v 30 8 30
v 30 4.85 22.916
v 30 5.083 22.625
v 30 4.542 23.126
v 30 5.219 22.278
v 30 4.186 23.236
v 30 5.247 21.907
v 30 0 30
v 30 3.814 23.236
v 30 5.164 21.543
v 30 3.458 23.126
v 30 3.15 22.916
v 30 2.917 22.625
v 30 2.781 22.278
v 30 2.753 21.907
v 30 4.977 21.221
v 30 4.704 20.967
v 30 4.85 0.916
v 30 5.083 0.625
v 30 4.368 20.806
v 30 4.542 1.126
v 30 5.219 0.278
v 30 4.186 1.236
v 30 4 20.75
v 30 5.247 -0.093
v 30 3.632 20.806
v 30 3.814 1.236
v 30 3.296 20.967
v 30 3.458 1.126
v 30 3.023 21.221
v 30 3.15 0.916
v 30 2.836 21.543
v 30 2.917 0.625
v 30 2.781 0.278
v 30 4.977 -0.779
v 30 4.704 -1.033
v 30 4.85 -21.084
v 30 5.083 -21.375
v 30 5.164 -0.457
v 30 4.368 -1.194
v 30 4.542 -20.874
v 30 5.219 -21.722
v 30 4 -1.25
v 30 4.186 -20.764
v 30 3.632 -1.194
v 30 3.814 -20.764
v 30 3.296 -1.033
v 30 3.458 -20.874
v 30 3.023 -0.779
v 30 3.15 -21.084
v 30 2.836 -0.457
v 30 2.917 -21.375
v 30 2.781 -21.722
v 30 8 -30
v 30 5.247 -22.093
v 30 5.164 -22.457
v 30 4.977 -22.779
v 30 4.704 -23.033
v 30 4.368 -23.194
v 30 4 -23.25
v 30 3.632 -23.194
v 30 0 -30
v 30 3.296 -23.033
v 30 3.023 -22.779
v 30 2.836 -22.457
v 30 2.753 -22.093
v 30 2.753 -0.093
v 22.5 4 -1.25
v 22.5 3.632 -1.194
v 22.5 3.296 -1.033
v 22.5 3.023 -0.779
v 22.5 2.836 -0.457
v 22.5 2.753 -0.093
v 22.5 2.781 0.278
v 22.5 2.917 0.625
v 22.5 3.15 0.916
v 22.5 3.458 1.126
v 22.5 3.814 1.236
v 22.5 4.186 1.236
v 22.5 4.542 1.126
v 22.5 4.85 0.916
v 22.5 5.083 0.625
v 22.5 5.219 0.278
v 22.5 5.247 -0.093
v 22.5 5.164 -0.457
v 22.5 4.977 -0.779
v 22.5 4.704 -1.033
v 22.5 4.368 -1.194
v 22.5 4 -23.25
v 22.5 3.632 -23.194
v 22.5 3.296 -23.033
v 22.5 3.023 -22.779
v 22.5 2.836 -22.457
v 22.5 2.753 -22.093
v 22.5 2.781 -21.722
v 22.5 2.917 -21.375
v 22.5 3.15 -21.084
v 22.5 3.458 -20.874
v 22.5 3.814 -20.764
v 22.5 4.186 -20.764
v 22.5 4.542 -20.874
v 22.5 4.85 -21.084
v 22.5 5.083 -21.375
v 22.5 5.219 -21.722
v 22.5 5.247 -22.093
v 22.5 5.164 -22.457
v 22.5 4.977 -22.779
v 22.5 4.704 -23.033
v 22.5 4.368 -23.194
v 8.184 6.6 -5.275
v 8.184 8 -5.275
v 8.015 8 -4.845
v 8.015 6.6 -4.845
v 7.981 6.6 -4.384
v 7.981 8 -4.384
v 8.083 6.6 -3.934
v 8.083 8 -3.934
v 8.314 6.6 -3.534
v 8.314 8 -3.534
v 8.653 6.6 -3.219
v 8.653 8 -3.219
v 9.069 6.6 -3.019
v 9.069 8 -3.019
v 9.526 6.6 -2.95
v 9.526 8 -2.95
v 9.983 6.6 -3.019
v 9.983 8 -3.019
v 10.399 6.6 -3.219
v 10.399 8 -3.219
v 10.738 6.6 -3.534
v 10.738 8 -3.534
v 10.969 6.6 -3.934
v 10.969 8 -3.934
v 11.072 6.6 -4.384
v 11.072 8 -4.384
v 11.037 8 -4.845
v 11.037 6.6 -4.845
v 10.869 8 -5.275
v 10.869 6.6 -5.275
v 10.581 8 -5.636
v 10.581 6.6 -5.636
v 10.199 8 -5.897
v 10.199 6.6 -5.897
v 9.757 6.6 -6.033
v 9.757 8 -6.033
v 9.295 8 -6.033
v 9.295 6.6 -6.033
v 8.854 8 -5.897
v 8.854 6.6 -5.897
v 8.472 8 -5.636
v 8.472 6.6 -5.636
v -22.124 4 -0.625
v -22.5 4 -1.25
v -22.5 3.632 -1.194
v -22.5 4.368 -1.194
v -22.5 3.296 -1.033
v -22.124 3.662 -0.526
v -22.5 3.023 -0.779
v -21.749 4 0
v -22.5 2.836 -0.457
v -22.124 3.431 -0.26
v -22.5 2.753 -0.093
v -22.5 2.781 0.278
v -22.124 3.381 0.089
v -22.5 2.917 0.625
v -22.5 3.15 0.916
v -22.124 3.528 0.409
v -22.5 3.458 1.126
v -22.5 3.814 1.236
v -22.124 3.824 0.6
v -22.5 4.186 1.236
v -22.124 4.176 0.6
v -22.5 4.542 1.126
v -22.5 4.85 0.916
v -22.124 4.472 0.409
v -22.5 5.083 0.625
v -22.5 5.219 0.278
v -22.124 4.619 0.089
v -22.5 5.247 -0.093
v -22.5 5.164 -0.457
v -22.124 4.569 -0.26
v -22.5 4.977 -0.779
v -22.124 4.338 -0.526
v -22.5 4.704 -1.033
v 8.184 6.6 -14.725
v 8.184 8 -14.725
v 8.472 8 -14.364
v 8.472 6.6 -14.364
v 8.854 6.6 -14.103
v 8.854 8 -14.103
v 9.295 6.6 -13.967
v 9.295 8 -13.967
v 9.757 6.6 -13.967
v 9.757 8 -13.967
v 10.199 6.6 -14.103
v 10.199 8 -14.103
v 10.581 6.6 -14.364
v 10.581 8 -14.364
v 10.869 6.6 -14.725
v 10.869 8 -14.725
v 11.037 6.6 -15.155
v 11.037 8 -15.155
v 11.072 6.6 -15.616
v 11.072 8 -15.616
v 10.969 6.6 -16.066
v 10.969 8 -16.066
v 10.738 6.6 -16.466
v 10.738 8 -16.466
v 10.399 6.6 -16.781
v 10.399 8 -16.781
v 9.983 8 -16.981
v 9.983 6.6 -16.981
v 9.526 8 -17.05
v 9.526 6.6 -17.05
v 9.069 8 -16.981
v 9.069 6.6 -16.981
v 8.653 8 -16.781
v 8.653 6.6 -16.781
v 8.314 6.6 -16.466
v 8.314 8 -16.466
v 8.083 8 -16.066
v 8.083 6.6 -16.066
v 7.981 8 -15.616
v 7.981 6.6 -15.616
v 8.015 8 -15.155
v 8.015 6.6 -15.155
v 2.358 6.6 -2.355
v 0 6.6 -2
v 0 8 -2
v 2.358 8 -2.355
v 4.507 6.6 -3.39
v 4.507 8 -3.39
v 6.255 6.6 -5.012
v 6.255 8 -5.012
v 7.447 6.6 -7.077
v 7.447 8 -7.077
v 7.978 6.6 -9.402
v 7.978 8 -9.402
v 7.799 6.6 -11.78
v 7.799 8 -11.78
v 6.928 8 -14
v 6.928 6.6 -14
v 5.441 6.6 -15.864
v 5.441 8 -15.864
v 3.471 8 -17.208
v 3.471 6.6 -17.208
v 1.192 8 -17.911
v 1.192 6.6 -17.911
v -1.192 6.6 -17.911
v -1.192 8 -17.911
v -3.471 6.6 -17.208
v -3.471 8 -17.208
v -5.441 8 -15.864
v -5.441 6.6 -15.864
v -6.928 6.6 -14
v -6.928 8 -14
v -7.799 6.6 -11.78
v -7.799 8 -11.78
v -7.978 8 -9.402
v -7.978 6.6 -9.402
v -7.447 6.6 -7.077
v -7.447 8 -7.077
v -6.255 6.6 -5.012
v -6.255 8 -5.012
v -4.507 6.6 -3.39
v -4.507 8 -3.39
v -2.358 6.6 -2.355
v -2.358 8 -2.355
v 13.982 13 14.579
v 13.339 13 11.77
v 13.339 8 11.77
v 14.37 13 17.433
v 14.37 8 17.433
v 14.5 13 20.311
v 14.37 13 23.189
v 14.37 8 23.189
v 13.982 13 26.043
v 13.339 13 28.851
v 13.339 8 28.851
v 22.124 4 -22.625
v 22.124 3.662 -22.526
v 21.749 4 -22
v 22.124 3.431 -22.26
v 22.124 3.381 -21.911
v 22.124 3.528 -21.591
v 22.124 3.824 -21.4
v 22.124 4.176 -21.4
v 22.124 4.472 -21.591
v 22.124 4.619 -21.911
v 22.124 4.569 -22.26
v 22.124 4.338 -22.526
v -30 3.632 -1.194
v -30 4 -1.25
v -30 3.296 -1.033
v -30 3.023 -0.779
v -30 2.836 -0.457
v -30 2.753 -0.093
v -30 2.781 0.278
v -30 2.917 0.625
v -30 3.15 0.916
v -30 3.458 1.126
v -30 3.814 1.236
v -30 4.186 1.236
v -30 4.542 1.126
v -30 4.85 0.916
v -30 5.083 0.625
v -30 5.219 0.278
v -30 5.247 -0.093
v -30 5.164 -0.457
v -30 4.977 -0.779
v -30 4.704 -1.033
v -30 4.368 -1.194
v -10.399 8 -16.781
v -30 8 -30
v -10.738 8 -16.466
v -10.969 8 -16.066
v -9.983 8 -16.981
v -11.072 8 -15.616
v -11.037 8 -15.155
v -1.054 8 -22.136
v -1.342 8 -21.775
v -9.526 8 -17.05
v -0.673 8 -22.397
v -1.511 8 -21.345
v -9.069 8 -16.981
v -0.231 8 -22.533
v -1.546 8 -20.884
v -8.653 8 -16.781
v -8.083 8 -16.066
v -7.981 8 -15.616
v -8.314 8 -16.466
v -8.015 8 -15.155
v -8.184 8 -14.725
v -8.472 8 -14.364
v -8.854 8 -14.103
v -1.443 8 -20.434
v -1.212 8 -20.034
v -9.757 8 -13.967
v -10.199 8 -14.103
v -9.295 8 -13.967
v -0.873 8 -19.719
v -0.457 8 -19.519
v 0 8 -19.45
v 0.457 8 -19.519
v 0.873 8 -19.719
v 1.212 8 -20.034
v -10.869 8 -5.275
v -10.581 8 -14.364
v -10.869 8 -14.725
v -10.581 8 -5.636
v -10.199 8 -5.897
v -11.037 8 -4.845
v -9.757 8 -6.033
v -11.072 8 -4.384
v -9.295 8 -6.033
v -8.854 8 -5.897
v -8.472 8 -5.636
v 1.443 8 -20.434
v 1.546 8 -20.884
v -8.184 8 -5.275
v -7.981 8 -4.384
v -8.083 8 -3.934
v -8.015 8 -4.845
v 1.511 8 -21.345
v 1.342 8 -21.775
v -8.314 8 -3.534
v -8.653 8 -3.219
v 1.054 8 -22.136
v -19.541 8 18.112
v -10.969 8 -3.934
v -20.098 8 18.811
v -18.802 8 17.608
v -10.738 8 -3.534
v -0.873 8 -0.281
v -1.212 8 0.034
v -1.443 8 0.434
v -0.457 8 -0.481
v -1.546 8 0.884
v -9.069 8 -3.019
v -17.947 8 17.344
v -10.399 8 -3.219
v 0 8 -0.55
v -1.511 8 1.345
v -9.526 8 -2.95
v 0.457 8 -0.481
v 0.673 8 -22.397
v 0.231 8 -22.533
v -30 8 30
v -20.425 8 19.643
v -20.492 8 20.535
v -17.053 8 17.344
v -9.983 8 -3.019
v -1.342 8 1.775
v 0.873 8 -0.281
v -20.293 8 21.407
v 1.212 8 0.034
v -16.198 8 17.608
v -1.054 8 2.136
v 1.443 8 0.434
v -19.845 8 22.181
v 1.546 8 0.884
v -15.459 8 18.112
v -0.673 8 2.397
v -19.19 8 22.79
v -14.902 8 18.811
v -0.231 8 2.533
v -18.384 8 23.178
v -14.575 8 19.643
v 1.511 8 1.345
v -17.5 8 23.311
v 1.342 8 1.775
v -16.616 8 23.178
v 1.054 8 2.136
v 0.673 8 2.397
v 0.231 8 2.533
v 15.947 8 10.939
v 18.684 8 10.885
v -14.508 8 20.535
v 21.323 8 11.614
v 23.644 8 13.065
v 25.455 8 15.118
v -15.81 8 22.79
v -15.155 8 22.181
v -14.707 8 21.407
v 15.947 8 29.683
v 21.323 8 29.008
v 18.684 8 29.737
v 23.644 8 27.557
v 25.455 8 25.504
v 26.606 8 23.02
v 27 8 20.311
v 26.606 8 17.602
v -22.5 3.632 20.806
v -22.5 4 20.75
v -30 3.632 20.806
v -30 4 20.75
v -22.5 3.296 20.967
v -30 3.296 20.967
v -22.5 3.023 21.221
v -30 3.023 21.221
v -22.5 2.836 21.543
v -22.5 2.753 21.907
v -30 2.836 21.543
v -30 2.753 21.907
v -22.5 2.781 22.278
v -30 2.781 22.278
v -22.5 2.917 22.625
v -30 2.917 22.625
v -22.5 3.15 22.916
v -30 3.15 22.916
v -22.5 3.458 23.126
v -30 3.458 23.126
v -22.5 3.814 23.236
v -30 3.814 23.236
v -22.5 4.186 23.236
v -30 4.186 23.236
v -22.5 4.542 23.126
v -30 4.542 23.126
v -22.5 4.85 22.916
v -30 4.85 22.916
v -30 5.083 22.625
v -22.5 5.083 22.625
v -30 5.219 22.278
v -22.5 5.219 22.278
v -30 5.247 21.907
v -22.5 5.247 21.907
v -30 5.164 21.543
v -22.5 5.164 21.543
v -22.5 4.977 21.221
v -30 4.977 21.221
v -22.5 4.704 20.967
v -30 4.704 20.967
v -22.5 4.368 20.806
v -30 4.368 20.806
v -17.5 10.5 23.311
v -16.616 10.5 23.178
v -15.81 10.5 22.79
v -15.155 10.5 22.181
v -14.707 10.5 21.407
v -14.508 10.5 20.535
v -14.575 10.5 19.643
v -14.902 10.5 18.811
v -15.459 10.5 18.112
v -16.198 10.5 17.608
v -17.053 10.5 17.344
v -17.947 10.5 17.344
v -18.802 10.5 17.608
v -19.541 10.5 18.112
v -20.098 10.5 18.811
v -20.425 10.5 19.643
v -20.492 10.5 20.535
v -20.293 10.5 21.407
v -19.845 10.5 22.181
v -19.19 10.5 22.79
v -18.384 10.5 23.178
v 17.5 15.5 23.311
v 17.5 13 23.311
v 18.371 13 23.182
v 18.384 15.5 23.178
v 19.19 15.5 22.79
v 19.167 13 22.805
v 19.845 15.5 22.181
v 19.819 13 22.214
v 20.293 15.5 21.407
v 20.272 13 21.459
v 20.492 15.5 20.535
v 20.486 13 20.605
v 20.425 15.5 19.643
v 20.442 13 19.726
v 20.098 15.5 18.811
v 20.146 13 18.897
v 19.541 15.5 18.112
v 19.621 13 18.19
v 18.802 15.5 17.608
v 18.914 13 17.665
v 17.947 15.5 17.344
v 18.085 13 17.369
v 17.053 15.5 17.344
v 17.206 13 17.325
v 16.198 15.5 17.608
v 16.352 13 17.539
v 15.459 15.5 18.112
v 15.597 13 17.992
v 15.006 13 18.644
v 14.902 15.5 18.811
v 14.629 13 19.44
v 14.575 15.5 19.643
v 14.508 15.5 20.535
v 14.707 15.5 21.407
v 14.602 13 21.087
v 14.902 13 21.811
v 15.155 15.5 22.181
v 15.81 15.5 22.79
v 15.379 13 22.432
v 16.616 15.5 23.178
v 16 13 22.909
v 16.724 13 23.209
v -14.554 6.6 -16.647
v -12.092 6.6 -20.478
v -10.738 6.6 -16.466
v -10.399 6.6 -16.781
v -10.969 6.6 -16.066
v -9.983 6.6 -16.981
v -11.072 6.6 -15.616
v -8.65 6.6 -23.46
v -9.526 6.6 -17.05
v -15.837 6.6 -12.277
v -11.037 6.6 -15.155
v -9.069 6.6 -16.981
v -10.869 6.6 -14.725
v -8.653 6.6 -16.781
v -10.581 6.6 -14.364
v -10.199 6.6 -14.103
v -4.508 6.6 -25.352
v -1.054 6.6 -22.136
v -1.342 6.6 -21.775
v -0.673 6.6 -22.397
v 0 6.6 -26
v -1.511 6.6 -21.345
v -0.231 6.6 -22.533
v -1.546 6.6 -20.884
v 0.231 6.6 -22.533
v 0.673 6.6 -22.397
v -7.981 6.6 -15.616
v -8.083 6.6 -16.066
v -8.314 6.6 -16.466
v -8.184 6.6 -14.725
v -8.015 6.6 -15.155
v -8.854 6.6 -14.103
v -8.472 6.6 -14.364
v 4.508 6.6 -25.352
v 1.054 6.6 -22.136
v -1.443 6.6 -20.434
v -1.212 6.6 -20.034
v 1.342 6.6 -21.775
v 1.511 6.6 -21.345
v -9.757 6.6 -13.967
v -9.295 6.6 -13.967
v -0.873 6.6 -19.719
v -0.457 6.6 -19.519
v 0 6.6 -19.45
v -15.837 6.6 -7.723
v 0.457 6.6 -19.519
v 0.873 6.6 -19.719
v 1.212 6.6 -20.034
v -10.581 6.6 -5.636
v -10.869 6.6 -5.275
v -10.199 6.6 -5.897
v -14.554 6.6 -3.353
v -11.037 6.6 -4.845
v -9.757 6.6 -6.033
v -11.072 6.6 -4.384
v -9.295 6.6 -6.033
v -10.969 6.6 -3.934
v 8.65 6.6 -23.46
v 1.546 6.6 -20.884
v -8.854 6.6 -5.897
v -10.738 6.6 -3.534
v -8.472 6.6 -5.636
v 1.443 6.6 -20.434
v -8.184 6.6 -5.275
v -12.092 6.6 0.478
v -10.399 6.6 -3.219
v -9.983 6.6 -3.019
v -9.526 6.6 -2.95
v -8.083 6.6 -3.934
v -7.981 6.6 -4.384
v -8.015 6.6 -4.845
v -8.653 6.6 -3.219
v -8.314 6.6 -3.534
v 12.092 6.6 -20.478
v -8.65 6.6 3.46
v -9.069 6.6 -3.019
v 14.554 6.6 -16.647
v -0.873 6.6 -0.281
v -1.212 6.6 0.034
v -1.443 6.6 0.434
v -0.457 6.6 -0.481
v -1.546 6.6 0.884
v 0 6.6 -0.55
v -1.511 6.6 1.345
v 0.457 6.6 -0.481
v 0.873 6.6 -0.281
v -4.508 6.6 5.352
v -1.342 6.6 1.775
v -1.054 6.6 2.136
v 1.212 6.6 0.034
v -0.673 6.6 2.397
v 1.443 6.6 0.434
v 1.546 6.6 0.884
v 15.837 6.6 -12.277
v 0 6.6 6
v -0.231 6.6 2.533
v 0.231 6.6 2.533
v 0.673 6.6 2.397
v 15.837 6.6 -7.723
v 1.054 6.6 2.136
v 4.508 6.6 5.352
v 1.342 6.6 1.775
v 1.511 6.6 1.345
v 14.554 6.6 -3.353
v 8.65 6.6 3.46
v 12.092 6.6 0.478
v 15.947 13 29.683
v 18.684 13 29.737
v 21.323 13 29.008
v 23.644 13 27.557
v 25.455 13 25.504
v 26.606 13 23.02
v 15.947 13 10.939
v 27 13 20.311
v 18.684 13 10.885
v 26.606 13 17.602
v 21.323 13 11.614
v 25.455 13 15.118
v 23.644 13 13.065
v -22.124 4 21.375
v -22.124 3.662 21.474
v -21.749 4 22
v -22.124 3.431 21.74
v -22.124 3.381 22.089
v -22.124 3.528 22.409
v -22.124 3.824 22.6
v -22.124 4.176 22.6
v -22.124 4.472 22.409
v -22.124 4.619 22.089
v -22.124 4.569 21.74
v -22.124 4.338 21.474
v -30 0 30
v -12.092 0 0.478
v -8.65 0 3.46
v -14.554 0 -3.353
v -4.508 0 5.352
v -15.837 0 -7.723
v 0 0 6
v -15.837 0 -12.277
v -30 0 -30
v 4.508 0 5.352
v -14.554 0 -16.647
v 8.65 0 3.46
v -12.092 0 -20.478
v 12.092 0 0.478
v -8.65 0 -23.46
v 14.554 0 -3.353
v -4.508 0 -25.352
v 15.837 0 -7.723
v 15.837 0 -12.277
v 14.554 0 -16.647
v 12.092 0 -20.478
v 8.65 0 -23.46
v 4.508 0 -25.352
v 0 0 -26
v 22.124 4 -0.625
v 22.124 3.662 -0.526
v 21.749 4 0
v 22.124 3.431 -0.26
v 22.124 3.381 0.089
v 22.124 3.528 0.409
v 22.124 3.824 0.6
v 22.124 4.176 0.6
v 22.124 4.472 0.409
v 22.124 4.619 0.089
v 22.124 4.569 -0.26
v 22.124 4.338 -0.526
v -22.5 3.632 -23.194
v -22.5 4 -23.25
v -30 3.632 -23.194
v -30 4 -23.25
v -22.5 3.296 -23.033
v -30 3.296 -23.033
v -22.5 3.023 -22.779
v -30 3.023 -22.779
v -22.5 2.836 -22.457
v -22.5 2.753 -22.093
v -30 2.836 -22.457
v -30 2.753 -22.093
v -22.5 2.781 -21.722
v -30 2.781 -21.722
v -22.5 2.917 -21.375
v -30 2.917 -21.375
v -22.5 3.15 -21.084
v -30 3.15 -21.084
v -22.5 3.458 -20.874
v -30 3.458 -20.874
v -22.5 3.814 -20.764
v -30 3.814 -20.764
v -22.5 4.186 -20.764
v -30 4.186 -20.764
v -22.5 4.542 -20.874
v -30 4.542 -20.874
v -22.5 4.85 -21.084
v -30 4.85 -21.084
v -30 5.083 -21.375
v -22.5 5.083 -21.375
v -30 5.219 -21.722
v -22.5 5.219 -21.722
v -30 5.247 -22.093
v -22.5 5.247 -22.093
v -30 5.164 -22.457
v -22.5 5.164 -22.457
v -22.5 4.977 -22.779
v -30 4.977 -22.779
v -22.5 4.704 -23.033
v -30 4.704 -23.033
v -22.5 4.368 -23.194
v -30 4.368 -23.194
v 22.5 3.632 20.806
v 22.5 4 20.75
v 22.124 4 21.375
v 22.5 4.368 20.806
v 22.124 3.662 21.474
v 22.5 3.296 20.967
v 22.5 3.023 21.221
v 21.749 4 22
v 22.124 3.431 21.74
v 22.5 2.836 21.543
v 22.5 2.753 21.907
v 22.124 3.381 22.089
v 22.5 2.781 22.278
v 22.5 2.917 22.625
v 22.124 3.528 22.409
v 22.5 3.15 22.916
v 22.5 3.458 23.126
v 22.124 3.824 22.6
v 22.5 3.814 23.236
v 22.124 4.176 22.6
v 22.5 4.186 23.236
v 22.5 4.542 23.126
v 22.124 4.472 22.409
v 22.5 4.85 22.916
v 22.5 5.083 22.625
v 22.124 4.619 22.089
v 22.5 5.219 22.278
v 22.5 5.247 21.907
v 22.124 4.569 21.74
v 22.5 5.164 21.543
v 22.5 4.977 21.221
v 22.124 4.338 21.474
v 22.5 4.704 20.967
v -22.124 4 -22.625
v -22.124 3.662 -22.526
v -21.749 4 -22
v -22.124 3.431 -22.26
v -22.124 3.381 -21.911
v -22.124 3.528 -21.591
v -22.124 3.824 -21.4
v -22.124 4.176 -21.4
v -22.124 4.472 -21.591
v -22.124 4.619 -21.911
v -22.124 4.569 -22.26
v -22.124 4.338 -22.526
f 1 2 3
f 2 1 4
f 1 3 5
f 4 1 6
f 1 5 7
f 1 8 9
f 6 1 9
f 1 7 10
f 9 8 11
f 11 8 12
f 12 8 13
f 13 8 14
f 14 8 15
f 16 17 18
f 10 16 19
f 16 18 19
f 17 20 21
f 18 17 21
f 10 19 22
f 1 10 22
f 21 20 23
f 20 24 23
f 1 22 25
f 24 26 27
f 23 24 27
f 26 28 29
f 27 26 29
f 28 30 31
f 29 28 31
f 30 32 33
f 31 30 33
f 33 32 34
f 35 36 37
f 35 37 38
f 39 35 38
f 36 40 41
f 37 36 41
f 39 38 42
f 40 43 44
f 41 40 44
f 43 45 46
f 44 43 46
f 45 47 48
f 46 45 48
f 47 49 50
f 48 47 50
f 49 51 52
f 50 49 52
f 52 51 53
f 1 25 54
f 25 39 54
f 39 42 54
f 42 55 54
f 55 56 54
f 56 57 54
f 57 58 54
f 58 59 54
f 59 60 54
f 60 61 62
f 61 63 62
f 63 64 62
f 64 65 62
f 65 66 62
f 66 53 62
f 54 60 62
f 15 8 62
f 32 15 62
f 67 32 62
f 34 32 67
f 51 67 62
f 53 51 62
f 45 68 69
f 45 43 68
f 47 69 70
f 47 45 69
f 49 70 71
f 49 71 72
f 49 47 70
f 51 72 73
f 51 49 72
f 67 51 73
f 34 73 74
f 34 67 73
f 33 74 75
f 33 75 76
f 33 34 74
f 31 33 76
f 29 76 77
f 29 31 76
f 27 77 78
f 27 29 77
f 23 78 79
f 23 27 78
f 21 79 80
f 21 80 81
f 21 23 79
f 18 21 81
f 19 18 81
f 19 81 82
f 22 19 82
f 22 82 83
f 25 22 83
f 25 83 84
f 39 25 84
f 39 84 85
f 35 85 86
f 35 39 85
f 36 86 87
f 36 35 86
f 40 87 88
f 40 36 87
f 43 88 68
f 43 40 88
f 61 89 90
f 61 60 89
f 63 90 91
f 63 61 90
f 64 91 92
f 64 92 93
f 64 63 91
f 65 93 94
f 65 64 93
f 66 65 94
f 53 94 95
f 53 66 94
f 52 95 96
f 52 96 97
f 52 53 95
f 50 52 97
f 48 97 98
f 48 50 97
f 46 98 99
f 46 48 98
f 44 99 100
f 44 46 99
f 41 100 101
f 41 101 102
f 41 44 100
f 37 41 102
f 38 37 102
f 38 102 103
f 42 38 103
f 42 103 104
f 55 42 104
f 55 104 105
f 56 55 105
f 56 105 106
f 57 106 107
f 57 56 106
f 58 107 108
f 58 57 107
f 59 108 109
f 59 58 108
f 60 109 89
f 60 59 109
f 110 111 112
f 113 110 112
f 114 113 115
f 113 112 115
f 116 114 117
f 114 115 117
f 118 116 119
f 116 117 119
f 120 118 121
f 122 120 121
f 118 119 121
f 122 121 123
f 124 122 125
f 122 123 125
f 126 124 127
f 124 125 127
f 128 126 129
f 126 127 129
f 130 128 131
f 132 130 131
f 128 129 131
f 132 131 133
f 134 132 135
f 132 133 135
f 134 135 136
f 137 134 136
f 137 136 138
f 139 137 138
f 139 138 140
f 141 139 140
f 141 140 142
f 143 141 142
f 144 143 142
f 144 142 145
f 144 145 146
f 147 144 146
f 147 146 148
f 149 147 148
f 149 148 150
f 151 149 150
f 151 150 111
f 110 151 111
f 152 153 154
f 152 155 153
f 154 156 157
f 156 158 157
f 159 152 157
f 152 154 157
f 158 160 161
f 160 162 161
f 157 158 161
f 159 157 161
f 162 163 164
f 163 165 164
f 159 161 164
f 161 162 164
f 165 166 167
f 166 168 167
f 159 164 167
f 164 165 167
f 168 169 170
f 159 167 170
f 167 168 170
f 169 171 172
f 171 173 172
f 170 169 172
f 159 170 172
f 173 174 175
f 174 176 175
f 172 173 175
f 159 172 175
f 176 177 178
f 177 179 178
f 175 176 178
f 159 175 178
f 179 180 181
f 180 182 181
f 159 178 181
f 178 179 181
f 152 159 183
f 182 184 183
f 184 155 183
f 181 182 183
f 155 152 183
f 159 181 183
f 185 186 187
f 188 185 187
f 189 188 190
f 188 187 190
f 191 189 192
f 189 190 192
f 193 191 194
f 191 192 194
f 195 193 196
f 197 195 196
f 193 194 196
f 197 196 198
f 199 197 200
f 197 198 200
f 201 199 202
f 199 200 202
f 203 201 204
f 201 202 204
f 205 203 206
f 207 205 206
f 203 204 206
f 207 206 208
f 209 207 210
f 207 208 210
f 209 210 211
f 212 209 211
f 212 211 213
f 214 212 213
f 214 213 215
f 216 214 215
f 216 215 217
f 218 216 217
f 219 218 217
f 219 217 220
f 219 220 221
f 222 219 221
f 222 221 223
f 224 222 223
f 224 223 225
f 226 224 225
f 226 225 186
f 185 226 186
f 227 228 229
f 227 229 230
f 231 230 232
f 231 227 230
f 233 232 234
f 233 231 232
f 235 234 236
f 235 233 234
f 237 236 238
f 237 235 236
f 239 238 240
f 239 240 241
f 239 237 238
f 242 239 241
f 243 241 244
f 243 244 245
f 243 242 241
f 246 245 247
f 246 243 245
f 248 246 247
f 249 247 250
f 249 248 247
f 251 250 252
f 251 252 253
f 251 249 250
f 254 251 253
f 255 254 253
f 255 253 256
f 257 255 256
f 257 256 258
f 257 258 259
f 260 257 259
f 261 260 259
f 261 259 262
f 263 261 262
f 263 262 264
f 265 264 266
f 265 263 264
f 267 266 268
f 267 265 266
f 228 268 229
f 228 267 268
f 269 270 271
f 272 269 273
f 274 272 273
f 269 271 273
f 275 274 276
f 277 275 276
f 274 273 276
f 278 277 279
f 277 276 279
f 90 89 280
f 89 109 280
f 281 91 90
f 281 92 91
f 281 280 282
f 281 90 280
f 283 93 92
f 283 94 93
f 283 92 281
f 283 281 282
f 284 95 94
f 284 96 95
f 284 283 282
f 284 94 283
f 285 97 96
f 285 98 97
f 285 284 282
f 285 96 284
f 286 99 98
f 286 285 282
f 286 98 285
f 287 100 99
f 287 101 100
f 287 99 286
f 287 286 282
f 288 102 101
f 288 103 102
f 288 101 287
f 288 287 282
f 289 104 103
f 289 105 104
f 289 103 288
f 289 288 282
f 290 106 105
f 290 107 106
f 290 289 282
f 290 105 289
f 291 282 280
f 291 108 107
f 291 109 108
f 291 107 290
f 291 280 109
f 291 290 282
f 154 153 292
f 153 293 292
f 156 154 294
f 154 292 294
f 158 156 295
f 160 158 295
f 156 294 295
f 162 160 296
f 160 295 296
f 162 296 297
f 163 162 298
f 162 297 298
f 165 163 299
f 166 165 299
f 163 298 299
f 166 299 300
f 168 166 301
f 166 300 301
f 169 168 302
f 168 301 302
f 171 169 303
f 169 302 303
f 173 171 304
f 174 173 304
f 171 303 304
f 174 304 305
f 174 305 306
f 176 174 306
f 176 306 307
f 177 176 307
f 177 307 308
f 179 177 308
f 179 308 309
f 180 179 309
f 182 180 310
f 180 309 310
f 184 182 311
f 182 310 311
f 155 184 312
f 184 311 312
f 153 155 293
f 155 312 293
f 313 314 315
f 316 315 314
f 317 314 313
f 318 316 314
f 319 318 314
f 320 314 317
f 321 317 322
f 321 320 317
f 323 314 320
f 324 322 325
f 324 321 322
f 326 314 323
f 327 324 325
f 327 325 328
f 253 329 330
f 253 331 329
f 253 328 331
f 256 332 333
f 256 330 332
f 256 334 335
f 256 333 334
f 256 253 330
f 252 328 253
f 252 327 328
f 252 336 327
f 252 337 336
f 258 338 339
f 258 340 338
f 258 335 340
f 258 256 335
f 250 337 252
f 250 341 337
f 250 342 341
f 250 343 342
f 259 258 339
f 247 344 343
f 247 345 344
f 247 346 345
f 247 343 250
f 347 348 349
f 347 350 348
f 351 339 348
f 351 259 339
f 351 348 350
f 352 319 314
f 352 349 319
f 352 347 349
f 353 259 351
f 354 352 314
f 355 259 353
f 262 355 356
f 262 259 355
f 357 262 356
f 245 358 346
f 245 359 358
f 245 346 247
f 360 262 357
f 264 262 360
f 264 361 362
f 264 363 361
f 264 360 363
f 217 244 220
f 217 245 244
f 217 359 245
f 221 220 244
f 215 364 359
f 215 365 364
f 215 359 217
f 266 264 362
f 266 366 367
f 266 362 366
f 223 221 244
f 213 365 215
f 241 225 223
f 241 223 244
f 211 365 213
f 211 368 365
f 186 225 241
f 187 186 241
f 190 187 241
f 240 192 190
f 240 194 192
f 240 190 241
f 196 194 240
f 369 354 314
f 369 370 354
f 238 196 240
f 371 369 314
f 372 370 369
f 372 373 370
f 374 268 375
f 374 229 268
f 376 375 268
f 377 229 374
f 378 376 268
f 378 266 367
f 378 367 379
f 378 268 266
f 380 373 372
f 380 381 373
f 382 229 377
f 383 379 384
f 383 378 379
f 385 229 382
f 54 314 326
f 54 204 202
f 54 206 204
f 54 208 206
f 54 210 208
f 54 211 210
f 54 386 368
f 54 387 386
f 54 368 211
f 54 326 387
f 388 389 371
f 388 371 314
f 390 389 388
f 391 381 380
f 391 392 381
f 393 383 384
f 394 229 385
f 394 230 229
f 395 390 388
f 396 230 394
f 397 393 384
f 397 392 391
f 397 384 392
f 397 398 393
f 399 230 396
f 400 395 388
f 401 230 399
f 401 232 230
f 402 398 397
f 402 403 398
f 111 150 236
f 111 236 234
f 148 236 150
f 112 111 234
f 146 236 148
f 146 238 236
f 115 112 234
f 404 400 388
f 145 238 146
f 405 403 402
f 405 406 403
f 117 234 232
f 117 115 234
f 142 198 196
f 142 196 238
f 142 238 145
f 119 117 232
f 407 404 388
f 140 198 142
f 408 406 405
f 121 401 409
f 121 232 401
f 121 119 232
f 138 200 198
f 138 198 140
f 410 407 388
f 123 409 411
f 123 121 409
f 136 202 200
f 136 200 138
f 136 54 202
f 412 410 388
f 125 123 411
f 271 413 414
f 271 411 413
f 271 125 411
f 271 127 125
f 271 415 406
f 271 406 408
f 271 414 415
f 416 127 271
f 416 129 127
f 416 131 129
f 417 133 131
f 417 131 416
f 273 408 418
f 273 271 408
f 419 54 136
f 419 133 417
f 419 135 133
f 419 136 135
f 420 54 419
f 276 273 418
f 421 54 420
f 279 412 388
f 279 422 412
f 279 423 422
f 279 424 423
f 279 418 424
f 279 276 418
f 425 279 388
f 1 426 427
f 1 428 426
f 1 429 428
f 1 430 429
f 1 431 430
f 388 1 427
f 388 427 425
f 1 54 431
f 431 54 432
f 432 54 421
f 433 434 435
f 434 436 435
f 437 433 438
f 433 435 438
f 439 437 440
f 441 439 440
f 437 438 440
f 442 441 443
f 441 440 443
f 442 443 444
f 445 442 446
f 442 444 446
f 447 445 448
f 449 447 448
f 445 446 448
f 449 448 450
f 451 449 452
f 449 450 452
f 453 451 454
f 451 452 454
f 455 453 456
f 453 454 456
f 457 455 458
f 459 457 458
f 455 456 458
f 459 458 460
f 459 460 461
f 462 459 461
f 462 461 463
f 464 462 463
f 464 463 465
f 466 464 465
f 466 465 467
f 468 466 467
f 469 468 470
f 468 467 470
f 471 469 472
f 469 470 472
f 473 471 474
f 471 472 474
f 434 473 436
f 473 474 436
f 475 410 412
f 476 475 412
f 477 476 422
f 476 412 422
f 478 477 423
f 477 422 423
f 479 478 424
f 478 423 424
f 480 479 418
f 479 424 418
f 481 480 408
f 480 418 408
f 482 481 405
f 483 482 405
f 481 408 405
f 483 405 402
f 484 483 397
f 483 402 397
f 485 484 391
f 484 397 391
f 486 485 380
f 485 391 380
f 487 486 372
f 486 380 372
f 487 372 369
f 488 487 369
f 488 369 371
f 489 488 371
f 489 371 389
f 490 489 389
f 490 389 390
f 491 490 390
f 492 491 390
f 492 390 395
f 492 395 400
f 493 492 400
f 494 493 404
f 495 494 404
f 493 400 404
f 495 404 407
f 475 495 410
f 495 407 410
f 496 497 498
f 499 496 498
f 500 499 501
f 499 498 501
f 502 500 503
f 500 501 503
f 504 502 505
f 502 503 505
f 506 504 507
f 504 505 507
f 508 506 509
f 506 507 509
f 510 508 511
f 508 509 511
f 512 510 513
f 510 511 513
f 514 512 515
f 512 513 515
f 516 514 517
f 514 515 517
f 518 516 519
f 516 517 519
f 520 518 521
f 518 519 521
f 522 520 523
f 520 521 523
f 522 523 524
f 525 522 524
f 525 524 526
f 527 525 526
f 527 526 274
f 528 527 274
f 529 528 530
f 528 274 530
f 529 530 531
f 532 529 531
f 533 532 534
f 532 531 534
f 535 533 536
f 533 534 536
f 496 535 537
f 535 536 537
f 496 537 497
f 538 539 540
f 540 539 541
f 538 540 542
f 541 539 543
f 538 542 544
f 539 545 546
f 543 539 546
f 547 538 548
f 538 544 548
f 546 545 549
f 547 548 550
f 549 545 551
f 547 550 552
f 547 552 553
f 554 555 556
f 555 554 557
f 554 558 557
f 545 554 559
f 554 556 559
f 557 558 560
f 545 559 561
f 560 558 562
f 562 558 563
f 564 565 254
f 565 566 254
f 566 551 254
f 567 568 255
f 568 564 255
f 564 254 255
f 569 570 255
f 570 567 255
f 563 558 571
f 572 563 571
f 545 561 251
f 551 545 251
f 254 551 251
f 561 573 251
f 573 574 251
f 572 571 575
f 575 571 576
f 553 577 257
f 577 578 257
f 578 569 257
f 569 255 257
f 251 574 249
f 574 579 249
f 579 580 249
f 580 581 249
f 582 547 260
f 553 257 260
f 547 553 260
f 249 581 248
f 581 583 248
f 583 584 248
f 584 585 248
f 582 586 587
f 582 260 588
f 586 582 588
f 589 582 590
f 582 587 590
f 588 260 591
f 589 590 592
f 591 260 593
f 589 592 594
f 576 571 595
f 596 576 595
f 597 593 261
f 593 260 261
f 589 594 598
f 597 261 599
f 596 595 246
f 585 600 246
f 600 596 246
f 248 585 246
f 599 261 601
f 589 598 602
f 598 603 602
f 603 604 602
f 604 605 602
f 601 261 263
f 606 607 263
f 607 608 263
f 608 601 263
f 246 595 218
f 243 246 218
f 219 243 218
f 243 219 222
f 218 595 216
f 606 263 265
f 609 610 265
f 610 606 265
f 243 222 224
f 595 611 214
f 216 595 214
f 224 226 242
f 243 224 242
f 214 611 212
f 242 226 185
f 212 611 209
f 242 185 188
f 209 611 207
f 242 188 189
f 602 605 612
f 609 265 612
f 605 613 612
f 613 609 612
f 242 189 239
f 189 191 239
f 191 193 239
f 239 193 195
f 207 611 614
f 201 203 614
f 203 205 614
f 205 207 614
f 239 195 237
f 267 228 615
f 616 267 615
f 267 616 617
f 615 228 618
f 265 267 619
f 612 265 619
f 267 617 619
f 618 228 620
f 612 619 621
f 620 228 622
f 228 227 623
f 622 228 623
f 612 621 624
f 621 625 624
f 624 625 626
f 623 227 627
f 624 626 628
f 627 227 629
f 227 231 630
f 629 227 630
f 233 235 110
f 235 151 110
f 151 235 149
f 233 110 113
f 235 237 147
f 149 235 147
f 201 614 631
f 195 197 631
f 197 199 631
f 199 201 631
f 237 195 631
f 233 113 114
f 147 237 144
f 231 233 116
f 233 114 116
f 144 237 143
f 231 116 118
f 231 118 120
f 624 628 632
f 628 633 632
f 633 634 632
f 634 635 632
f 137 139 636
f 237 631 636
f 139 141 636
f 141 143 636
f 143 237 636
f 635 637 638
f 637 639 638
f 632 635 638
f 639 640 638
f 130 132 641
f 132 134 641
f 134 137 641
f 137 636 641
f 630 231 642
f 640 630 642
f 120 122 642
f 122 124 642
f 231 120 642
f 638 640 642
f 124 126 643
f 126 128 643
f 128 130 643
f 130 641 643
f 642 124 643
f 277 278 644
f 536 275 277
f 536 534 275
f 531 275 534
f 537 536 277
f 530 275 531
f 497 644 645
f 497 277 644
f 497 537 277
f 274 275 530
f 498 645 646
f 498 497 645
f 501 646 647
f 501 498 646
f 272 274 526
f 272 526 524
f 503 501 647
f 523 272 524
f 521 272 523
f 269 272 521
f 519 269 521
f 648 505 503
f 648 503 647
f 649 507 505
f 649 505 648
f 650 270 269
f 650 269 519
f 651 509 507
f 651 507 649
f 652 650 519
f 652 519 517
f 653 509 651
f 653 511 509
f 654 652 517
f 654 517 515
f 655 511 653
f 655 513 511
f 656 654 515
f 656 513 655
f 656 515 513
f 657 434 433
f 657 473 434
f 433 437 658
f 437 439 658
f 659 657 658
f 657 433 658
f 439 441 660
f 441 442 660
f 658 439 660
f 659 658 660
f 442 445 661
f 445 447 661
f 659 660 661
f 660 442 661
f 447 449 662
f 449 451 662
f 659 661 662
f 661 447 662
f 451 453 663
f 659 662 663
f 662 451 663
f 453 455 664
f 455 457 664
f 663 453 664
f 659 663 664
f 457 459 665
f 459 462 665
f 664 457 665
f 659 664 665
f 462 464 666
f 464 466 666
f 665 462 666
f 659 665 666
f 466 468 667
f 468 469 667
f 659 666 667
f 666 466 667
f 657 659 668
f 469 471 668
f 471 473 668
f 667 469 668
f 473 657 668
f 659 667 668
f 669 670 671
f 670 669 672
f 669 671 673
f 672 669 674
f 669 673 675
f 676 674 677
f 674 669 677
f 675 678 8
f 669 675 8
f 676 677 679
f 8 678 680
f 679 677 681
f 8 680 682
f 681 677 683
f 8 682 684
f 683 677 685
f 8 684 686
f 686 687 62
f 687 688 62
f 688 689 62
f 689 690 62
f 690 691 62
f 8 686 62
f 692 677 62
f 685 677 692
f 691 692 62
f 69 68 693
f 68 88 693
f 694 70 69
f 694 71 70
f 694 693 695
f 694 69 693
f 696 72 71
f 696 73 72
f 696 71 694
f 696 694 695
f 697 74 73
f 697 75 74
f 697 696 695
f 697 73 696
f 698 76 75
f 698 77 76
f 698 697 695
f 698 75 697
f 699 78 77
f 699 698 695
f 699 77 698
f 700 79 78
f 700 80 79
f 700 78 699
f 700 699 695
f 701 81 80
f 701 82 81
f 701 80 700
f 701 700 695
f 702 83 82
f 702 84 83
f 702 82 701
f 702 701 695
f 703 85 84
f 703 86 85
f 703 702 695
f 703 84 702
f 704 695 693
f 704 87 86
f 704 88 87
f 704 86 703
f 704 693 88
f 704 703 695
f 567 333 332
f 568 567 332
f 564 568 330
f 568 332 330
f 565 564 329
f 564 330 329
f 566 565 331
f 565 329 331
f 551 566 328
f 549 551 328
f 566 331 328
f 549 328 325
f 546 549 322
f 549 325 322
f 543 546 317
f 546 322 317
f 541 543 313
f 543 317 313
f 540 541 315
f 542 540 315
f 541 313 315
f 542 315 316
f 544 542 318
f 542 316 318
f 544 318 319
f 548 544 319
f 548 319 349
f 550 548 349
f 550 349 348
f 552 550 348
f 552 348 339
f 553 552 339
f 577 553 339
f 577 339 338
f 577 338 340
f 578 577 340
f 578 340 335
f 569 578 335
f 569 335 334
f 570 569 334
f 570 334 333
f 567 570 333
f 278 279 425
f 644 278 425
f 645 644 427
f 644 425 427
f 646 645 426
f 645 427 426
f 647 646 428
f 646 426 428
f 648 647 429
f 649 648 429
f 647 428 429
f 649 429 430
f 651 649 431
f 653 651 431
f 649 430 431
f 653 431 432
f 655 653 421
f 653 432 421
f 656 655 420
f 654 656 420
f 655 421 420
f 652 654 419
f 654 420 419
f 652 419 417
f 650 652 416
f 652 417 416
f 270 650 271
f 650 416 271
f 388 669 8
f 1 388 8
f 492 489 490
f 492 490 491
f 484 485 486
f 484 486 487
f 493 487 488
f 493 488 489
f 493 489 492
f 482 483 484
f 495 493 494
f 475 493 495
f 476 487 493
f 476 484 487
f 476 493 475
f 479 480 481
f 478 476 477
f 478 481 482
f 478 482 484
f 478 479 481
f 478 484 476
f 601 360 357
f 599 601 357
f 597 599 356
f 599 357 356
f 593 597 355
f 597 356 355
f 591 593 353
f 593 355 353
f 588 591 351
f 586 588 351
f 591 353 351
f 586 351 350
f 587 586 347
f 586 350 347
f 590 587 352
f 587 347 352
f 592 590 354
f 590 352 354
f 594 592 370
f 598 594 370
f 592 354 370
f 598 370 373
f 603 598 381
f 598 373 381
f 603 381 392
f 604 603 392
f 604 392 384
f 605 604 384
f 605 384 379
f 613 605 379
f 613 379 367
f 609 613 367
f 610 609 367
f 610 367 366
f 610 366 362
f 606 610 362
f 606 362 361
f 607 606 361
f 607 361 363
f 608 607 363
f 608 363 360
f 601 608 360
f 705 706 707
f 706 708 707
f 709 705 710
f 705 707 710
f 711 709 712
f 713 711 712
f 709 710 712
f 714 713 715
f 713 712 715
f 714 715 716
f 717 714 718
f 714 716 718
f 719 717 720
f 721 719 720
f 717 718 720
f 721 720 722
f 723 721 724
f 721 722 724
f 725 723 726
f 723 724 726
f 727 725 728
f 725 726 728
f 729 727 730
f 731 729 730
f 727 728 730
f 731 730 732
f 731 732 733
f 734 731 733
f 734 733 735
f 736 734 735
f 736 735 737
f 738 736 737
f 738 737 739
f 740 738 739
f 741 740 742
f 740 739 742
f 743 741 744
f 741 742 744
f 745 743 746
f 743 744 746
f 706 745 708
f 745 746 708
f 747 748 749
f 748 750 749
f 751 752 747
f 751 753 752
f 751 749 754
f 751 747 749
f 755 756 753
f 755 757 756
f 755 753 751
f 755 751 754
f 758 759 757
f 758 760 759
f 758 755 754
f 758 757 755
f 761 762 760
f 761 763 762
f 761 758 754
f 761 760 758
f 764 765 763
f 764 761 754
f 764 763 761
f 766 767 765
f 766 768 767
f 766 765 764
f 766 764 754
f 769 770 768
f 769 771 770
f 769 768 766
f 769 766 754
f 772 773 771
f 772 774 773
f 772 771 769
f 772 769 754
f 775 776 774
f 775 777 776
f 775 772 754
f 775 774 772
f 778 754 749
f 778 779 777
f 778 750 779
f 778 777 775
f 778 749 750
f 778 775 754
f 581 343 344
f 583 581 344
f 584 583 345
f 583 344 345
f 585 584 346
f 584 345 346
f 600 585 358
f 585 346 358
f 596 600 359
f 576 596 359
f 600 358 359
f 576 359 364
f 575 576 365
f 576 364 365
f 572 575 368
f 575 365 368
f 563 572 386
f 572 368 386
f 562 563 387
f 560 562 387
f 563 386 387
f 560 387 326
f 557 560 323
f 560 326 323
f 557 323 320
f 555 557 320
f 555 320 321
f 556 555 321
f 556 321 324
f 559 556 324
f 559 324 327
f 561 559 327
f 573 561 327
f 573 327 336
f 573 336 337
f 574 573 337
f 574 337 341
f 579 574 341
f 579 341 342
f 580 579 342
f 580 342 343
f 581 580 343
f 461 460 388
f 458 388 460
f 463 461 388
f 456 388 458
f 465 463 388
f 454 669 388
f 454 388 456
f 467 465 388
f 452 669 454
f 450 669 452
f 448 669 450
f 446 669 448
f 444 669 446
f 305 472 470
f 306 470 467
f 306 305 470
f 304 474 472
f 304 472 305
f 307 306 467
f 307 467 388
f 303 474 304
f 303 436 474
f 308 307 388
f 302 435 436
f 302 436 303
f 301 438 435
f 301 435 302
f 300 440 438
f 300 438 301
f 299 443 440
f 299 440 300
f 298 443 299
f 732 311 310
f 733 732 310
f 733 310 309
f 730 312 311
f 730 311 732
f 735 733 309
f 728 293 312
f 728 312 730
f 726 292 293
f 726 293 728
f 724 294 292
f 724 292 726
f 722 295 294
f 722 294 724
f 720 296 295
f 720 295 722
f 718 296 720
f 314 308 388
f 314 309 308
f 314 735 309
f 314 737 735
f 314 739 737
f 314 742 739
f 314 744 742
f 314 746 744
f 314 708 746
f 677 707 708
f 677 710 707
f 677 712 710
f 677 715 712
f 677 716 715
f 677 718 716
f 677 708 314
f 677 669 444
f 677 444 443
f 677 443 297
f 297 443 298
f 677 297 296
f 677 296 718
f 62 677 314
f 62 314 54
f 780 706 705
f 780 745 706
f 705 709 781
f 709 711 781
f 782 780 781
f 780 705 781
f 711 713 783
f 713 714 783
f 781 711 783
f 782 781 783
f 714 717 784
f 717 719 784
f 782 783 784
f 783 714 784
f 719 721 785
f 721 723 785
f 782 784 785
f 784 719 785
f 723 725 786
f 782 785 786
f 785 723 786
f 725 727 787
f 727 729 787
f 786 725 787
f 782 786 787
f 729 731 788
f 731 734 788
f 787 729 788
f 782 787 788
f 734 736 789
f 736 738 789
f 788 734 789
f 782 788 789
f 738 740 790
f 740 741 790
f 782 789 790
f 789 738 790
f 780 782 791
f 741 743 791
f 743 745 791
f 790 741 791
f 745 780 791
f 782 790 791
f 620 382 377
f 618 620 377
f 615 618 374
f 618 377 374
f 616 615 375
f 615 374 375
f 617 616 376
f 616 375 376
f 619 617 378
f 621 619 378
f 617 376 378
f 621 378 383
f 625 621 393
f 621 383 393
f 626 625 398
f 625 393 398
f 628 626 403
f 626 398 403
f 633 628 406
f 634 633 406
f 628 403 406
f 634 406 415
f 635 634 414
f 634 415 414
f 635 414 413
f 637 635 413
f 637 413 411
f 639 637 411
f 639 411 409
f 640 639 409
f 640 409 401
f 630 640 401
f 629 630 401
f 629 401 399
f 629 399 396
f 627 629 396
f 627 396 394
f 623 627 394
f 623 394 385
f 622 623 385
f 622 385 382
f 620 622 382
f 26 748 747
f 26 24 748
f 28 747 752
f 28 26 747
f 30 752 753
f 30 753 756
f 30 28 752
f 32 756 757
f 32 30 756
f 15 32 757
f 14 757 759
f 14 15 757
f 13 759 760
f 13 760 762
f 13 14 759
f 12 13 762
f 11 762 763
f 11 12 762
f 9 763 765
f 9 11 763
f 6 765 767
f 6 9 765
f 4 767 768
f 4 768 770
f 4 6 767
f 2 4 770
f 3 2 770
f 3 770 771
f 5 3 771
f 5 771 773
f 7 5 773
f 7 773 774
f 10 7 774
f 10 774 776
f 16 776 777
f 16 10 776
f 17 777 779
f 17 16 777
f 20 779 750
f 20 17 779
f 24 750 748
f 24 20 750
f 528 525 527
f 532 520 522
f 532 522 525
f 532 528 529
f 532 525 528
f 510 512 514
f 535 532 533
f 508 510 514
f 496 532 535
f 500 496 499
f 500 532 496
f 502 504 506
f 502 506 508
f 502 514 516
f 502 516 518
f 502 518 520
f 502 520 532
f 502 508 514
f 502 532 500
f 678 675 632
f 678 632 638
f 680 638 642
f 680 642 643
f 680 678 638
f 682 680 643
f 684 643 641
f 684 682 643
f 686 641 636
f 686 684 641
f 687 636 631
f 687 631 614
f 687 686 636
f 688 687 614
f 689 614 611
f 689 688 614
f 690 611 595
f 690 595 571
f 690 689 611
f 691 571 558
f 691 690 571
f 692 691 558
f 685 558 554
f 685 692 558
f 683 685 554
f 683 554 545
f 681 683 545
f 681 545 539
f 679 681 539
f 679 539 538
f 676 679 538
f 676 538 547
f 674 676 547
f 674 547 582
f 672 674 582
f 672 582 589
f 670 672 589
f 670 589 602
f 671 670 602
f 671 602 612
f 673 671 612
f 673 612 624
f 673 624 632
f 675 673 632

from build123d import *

# Parameters (mm, degrees)
SKETCH1_W                  = 60
SKETCH1_H                  = 60
SKETCH1_R                  = 16
BOSS_EXTRUDE1_DEPTH        = 8
SKETCH2_R                  = 3
BOSS_EXTRUDE2_DEPTH        = 2.5
SKETCH7_R                  = 3
BOSS_EXTRUDE3_DEPTH        = 5
BOSS_EXTRUDE4_DEPTH        = 5
BOSS_EXTRUDE5_START        = -1.4
SKETCH9_R                  = 16
SKETCH9_R_2                = 8
BOSS_EXTRUDE5_DEPTH        = 1.4
SKETCH10_R                 = 1.55
CUT_EXTRUDE2_DEPTH         = 44.17406629
CIRPATTERN1_COUNT          = 6
M3_TAPPED_HOLE2_AT_2_COUNT = 2
M3_TAPPED_HOLE2_AT_2_PITCH = 22
M3_TAPPED_HOLE2_AT_3_COUNT = 2
M3_TAPPED_HOLE2_AT_3_PITCH = 44


with BuildPart() as part:
    # Sketch1 → Boss-Extrude1 (new body)
    with BuildSketch(Plane(origin=(0, 0, 0), x_dir=(1, 0, 0), z_dir=(0, 1, 0))):
        Rectangle(SKETCH1_W, SKETCH1_H)
        with Locations(Location((0, 10, 0), (0, 0, 270))):
            Circle(SKETCH1_R, mode=Mode.SUBTRACT)
    extrude(amount=BOSS_EXTRUDE1_DEPTH)

    # Sketch2 → Boss-Extrude2 (add)
    with BuildSketch(Plane(origin=(0, 8, 0), x_dir=(1, 0, 0), z_dir=(0, 1, 0))):
        with Locations(Location((-17.5, -20.310889132, 0), (0, 0, 270))):
            Circle(SKETCH2_R)
        with Locations(Location((17.5, -20.310889132, 0), (0, 0, 270))):
            Circle(SKETCH2_R)
    extrude(amount=BOSS_EXTRUDE2_DEPTH)

    # Sketch7 → Boss-Extrude3 (add)
    with BuildSketch(Plane(origin=(0, 10.5, 0), x_dir=(1, 0, 0), z_dir=(0, 1, 0))):
        with Locations(Location((17.5, -20.310889132, 0), (0, 0, 270))):
            Circle(SKETCH7_R)
    extrude(amount=BOSS_EXTRUDE3_DEPTH)

    # Sketch8 → Boss-Extrude4 (add)
    with BuildSketch(Plane(origin=(0, 8, 0), x_dir=(1, 0, 0), z_dir=(0, 1, 0))):
        with BuildLine():
            ThreePointArc((13.339285714, -28.851290565), (27, -20.310889132), (13.339285714, -11.7704877))
            ThreePointArc((13.339285714, -11.7704877), (14.5, -20.310889132), (13.339285714, -28.851290565))
        make_face()
    extrude(amount=BOSS_EXTRUDE4_DEPTH)

    # Sketch9 → Boss-Extrude5 (add)
    with BuildSketch(Plane(origin=(0, 8, 0), x_dir=(1, 0, 0), z_dir=(0, 1, 0)).offset(BOSS_EXTRUDE5_START)):
        with Locations(Location((0, 10, 0), (0, 0, 270))):
            Circle(SKETCH9_R)
        with Locations(Location((0, 10, 0), (0, 0, 270))):
            Circle(SKETCH9_R_2, mode=Mode.SUBTRACT)
    extrude(amount=BOSS_EXTRUDE5_DEPTH)

    # Sketch10 → Cut-Extrude2 (cut, through all)
    with BuildSketch(Plane(origin=(0, 8, 0), x_dir=(1, 0, 0), z_dir=(0, 1, 0))):
        with Locations(Location((0, 21, 0), (0, 0, 270))):
            Circle(SKETCH10_R)
    cut_extrude2 = extrude(amount=-CUT_EXTRUDE2_DEPTH, mode=Mode.SUBTRACT)

    # CirPattern1: Cut-Extrude2 ×6 about axis
    cirpattern1_axis = Axis((0, 0, -10), (0, 1, 0))
    for i in range(1, CIRPATTERN1_COUNT):
        add(cut_extrude2.rotate(cirpattern1_axis, i * 360 / CIRPATTERN1_COUNT), mode=Mode.SUBTRACT)

    # Sketch16 → M3 Tapped Hole2 (revolve, cut)
    with BuildSketch(Plane(origin=(30, 4, 22), x_dir=(0, 0, -1), z_dir=(0, 1, 0))):
        Polygon((0, 0), (0, 8.251075774), (1.25, 7.5), (1.25, 0), align=None)
    m3_tapped_hole2 = revolve(axis=Axis((36.35, 4, 22), (-1, 0, 0)), mode=Mode.SUBTRACT)

    # M3 Tapped Hole2 at 2: M3 Tapped Hole2 ×2
    with Locations(*[(0, 0, -i * M3_TAPPED_HOLE2_AT_2_PITCH) for i in range(1, M3_TAPPED_HOLE2_AT_2_COUNT)]):
        add(m3_tapped_hole2, mode=Mode.SUBTRACT)

    # M3 Tapped Hole2 at 3: M3 Tapped Hole2 ×2
    with Locations(*[(0, 0, -i * M3_TAPPED_HOLE2_AT_3_PITCH) for i in range(1, M3_TAPPED_HOLE2_AT_3_COUNT)]):
        add(m3_tapped_hole2, mode=Mode.SUBTRACT)

    # Mirror1: M3 Tapped Hole2 across plane
    add(m3_tapped_hole2.mirror(Plane(origin=(0, 0, 0), x_dir=(0, 0, 1), z_dir=(1, 0, 0))), mode=Mode.SUBTRACT)

    # Mirror1 copy 1 sketch → Mirror1 copy 1 (revolve, cut)
    with BuildSketch(Plane(origin=(-30, 4, 0), x_dir=(0, 0, -1), z_dir=(0, 1, 0))):
        Polygon((0, 0), (0, -8.251075774), (1.25, -7.5), (1.25, 0), align=None)
    revolve(axis=Axis((-36.35, 4, 0), (-1, 0, 0)), mode=Mode.SUBTRACT)

    # Mirror1 copy 2 sketch → Mirror1 copy 2 (revolve, cut)
    with BuildSketch(Plane(origin=(-30, 4, -22), x_dir=(0, 0, -1), z_dir=(0, 1, 0))):
        Polygon((0, 0), (0, -8.251075774), (1.25, -7.5), (1.25, 0), align=None)
    revolve(axis=Axis((-36.35, 4, -22), (-1, 0, 0)), mode=Mode.SUBTRACT)


solid = part.part
